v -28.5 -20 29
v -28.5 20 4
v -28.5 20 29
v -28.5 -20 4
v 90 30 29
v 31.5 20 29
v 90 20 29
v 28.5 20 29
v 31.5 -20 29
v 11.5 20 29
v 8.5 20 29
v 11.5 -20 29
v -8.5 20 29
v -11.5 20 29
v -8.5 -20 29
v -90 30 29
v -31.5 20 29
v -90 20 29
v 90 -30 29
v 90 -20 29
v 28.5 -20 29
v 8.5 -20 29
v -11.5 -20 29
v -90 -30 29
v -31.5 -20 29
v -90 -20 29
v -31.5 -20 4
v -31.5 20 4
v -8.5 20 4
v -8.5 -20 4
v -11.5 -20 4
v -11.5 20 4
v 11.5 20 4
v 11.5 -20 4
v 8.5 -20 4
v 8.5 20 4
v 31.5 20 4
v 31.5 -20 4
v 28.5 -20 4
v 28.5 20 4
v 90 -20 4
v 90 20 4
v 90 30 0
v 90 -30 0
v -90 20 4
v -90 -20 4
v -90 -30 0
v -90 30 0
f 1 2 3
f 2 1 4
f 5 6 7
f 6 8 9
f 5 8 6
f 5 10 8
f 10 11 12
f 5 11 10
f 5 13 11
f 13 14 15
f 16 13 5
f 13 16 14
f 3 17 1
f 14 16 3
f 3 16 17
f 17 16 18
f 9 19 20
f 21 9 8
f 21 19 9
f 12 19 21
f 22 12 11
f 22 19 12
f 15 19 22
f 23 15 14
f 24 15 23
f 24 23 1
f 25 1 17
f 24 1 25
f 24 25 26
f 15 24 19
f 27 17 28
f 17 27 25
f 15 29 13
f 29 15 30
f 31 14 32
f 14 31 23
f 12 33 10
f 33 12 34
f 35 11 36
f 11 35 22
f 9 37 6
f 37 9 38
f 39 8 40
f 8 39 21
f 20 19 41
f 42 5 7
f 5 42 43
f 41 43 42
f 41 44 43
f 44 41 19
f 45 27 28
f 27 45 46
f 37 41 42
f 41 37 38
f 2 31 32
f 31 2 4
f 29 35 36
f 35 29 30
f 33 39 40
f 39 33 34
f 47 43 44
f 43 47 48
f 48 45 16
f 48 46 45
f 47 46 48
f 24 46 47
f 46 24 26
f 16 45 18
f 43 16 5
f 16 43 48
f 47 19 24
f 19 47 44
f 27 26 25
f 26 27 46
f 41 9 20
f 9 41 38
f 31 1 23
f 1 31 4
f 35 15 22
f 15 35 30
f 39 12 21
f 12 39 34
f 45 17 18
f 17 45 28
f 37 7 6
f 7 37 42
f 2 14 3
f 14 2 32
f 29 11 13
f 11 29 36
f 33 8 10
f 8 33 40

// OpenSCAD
$fn = 32;

// ----------------------------------------------------------------------
// Rib frame 180 x 60 x 29
// 4 ribs at 20 mm pitch
// ----------------------------------------------------------------------

// --- parameters (mm) ---
frame = [180, 60, 4];  // base plate size (x, y, z)
rail_w = 10;           // side rail width
ribs = 4;              // number of ribs
rib_t = 3;             // rib thickness
rib_h = 25;            // rib height above the base plate
pitch = 20;            // pitch between rib centres

// --- derived feature positions (mm) ---
span = (ribs - 1) * pitch;          // = 60   distance between the outer ribs
origin_x = -span / 2;               // = -30   X of the first rib
rib_len = frame[1] - 2 * rail_w + 2;  // = 42   rib length, 1 mm into each rail
feature_centers = [
  [origin_x + 0 * pitch, 0],
  [origin_x + 1 * pitch, 0],
  [origin_x + 2 * pitch, 0],
  [origin_x + 3 * pitch, 0]
];   // rib centre line, drives the rib loop

// base plate, two side rails, then the ribs read straight off feature_centers
union() {
  translate([-frame[0] / 2, -frame[1] / 2, 0]) cube(frame);
  translate([-frame[0] / 2, -frame[1] / 2, 0]) cube([frame[0], rail_w, frame[2] + rib_h]);
  translate([-frame[0] / 2, frame[1] / 2 - rail_w, 0]) cube([frame[0], rail_w, frame[2] + rib_h]);
  for (centre = feature_centers)
    translate([centre[0] - rib_t / 2, centre[1] - rib_len / 2, frame[2] - 1])
      cube([rib_t, rib_len, rib_h + 1]);
}
